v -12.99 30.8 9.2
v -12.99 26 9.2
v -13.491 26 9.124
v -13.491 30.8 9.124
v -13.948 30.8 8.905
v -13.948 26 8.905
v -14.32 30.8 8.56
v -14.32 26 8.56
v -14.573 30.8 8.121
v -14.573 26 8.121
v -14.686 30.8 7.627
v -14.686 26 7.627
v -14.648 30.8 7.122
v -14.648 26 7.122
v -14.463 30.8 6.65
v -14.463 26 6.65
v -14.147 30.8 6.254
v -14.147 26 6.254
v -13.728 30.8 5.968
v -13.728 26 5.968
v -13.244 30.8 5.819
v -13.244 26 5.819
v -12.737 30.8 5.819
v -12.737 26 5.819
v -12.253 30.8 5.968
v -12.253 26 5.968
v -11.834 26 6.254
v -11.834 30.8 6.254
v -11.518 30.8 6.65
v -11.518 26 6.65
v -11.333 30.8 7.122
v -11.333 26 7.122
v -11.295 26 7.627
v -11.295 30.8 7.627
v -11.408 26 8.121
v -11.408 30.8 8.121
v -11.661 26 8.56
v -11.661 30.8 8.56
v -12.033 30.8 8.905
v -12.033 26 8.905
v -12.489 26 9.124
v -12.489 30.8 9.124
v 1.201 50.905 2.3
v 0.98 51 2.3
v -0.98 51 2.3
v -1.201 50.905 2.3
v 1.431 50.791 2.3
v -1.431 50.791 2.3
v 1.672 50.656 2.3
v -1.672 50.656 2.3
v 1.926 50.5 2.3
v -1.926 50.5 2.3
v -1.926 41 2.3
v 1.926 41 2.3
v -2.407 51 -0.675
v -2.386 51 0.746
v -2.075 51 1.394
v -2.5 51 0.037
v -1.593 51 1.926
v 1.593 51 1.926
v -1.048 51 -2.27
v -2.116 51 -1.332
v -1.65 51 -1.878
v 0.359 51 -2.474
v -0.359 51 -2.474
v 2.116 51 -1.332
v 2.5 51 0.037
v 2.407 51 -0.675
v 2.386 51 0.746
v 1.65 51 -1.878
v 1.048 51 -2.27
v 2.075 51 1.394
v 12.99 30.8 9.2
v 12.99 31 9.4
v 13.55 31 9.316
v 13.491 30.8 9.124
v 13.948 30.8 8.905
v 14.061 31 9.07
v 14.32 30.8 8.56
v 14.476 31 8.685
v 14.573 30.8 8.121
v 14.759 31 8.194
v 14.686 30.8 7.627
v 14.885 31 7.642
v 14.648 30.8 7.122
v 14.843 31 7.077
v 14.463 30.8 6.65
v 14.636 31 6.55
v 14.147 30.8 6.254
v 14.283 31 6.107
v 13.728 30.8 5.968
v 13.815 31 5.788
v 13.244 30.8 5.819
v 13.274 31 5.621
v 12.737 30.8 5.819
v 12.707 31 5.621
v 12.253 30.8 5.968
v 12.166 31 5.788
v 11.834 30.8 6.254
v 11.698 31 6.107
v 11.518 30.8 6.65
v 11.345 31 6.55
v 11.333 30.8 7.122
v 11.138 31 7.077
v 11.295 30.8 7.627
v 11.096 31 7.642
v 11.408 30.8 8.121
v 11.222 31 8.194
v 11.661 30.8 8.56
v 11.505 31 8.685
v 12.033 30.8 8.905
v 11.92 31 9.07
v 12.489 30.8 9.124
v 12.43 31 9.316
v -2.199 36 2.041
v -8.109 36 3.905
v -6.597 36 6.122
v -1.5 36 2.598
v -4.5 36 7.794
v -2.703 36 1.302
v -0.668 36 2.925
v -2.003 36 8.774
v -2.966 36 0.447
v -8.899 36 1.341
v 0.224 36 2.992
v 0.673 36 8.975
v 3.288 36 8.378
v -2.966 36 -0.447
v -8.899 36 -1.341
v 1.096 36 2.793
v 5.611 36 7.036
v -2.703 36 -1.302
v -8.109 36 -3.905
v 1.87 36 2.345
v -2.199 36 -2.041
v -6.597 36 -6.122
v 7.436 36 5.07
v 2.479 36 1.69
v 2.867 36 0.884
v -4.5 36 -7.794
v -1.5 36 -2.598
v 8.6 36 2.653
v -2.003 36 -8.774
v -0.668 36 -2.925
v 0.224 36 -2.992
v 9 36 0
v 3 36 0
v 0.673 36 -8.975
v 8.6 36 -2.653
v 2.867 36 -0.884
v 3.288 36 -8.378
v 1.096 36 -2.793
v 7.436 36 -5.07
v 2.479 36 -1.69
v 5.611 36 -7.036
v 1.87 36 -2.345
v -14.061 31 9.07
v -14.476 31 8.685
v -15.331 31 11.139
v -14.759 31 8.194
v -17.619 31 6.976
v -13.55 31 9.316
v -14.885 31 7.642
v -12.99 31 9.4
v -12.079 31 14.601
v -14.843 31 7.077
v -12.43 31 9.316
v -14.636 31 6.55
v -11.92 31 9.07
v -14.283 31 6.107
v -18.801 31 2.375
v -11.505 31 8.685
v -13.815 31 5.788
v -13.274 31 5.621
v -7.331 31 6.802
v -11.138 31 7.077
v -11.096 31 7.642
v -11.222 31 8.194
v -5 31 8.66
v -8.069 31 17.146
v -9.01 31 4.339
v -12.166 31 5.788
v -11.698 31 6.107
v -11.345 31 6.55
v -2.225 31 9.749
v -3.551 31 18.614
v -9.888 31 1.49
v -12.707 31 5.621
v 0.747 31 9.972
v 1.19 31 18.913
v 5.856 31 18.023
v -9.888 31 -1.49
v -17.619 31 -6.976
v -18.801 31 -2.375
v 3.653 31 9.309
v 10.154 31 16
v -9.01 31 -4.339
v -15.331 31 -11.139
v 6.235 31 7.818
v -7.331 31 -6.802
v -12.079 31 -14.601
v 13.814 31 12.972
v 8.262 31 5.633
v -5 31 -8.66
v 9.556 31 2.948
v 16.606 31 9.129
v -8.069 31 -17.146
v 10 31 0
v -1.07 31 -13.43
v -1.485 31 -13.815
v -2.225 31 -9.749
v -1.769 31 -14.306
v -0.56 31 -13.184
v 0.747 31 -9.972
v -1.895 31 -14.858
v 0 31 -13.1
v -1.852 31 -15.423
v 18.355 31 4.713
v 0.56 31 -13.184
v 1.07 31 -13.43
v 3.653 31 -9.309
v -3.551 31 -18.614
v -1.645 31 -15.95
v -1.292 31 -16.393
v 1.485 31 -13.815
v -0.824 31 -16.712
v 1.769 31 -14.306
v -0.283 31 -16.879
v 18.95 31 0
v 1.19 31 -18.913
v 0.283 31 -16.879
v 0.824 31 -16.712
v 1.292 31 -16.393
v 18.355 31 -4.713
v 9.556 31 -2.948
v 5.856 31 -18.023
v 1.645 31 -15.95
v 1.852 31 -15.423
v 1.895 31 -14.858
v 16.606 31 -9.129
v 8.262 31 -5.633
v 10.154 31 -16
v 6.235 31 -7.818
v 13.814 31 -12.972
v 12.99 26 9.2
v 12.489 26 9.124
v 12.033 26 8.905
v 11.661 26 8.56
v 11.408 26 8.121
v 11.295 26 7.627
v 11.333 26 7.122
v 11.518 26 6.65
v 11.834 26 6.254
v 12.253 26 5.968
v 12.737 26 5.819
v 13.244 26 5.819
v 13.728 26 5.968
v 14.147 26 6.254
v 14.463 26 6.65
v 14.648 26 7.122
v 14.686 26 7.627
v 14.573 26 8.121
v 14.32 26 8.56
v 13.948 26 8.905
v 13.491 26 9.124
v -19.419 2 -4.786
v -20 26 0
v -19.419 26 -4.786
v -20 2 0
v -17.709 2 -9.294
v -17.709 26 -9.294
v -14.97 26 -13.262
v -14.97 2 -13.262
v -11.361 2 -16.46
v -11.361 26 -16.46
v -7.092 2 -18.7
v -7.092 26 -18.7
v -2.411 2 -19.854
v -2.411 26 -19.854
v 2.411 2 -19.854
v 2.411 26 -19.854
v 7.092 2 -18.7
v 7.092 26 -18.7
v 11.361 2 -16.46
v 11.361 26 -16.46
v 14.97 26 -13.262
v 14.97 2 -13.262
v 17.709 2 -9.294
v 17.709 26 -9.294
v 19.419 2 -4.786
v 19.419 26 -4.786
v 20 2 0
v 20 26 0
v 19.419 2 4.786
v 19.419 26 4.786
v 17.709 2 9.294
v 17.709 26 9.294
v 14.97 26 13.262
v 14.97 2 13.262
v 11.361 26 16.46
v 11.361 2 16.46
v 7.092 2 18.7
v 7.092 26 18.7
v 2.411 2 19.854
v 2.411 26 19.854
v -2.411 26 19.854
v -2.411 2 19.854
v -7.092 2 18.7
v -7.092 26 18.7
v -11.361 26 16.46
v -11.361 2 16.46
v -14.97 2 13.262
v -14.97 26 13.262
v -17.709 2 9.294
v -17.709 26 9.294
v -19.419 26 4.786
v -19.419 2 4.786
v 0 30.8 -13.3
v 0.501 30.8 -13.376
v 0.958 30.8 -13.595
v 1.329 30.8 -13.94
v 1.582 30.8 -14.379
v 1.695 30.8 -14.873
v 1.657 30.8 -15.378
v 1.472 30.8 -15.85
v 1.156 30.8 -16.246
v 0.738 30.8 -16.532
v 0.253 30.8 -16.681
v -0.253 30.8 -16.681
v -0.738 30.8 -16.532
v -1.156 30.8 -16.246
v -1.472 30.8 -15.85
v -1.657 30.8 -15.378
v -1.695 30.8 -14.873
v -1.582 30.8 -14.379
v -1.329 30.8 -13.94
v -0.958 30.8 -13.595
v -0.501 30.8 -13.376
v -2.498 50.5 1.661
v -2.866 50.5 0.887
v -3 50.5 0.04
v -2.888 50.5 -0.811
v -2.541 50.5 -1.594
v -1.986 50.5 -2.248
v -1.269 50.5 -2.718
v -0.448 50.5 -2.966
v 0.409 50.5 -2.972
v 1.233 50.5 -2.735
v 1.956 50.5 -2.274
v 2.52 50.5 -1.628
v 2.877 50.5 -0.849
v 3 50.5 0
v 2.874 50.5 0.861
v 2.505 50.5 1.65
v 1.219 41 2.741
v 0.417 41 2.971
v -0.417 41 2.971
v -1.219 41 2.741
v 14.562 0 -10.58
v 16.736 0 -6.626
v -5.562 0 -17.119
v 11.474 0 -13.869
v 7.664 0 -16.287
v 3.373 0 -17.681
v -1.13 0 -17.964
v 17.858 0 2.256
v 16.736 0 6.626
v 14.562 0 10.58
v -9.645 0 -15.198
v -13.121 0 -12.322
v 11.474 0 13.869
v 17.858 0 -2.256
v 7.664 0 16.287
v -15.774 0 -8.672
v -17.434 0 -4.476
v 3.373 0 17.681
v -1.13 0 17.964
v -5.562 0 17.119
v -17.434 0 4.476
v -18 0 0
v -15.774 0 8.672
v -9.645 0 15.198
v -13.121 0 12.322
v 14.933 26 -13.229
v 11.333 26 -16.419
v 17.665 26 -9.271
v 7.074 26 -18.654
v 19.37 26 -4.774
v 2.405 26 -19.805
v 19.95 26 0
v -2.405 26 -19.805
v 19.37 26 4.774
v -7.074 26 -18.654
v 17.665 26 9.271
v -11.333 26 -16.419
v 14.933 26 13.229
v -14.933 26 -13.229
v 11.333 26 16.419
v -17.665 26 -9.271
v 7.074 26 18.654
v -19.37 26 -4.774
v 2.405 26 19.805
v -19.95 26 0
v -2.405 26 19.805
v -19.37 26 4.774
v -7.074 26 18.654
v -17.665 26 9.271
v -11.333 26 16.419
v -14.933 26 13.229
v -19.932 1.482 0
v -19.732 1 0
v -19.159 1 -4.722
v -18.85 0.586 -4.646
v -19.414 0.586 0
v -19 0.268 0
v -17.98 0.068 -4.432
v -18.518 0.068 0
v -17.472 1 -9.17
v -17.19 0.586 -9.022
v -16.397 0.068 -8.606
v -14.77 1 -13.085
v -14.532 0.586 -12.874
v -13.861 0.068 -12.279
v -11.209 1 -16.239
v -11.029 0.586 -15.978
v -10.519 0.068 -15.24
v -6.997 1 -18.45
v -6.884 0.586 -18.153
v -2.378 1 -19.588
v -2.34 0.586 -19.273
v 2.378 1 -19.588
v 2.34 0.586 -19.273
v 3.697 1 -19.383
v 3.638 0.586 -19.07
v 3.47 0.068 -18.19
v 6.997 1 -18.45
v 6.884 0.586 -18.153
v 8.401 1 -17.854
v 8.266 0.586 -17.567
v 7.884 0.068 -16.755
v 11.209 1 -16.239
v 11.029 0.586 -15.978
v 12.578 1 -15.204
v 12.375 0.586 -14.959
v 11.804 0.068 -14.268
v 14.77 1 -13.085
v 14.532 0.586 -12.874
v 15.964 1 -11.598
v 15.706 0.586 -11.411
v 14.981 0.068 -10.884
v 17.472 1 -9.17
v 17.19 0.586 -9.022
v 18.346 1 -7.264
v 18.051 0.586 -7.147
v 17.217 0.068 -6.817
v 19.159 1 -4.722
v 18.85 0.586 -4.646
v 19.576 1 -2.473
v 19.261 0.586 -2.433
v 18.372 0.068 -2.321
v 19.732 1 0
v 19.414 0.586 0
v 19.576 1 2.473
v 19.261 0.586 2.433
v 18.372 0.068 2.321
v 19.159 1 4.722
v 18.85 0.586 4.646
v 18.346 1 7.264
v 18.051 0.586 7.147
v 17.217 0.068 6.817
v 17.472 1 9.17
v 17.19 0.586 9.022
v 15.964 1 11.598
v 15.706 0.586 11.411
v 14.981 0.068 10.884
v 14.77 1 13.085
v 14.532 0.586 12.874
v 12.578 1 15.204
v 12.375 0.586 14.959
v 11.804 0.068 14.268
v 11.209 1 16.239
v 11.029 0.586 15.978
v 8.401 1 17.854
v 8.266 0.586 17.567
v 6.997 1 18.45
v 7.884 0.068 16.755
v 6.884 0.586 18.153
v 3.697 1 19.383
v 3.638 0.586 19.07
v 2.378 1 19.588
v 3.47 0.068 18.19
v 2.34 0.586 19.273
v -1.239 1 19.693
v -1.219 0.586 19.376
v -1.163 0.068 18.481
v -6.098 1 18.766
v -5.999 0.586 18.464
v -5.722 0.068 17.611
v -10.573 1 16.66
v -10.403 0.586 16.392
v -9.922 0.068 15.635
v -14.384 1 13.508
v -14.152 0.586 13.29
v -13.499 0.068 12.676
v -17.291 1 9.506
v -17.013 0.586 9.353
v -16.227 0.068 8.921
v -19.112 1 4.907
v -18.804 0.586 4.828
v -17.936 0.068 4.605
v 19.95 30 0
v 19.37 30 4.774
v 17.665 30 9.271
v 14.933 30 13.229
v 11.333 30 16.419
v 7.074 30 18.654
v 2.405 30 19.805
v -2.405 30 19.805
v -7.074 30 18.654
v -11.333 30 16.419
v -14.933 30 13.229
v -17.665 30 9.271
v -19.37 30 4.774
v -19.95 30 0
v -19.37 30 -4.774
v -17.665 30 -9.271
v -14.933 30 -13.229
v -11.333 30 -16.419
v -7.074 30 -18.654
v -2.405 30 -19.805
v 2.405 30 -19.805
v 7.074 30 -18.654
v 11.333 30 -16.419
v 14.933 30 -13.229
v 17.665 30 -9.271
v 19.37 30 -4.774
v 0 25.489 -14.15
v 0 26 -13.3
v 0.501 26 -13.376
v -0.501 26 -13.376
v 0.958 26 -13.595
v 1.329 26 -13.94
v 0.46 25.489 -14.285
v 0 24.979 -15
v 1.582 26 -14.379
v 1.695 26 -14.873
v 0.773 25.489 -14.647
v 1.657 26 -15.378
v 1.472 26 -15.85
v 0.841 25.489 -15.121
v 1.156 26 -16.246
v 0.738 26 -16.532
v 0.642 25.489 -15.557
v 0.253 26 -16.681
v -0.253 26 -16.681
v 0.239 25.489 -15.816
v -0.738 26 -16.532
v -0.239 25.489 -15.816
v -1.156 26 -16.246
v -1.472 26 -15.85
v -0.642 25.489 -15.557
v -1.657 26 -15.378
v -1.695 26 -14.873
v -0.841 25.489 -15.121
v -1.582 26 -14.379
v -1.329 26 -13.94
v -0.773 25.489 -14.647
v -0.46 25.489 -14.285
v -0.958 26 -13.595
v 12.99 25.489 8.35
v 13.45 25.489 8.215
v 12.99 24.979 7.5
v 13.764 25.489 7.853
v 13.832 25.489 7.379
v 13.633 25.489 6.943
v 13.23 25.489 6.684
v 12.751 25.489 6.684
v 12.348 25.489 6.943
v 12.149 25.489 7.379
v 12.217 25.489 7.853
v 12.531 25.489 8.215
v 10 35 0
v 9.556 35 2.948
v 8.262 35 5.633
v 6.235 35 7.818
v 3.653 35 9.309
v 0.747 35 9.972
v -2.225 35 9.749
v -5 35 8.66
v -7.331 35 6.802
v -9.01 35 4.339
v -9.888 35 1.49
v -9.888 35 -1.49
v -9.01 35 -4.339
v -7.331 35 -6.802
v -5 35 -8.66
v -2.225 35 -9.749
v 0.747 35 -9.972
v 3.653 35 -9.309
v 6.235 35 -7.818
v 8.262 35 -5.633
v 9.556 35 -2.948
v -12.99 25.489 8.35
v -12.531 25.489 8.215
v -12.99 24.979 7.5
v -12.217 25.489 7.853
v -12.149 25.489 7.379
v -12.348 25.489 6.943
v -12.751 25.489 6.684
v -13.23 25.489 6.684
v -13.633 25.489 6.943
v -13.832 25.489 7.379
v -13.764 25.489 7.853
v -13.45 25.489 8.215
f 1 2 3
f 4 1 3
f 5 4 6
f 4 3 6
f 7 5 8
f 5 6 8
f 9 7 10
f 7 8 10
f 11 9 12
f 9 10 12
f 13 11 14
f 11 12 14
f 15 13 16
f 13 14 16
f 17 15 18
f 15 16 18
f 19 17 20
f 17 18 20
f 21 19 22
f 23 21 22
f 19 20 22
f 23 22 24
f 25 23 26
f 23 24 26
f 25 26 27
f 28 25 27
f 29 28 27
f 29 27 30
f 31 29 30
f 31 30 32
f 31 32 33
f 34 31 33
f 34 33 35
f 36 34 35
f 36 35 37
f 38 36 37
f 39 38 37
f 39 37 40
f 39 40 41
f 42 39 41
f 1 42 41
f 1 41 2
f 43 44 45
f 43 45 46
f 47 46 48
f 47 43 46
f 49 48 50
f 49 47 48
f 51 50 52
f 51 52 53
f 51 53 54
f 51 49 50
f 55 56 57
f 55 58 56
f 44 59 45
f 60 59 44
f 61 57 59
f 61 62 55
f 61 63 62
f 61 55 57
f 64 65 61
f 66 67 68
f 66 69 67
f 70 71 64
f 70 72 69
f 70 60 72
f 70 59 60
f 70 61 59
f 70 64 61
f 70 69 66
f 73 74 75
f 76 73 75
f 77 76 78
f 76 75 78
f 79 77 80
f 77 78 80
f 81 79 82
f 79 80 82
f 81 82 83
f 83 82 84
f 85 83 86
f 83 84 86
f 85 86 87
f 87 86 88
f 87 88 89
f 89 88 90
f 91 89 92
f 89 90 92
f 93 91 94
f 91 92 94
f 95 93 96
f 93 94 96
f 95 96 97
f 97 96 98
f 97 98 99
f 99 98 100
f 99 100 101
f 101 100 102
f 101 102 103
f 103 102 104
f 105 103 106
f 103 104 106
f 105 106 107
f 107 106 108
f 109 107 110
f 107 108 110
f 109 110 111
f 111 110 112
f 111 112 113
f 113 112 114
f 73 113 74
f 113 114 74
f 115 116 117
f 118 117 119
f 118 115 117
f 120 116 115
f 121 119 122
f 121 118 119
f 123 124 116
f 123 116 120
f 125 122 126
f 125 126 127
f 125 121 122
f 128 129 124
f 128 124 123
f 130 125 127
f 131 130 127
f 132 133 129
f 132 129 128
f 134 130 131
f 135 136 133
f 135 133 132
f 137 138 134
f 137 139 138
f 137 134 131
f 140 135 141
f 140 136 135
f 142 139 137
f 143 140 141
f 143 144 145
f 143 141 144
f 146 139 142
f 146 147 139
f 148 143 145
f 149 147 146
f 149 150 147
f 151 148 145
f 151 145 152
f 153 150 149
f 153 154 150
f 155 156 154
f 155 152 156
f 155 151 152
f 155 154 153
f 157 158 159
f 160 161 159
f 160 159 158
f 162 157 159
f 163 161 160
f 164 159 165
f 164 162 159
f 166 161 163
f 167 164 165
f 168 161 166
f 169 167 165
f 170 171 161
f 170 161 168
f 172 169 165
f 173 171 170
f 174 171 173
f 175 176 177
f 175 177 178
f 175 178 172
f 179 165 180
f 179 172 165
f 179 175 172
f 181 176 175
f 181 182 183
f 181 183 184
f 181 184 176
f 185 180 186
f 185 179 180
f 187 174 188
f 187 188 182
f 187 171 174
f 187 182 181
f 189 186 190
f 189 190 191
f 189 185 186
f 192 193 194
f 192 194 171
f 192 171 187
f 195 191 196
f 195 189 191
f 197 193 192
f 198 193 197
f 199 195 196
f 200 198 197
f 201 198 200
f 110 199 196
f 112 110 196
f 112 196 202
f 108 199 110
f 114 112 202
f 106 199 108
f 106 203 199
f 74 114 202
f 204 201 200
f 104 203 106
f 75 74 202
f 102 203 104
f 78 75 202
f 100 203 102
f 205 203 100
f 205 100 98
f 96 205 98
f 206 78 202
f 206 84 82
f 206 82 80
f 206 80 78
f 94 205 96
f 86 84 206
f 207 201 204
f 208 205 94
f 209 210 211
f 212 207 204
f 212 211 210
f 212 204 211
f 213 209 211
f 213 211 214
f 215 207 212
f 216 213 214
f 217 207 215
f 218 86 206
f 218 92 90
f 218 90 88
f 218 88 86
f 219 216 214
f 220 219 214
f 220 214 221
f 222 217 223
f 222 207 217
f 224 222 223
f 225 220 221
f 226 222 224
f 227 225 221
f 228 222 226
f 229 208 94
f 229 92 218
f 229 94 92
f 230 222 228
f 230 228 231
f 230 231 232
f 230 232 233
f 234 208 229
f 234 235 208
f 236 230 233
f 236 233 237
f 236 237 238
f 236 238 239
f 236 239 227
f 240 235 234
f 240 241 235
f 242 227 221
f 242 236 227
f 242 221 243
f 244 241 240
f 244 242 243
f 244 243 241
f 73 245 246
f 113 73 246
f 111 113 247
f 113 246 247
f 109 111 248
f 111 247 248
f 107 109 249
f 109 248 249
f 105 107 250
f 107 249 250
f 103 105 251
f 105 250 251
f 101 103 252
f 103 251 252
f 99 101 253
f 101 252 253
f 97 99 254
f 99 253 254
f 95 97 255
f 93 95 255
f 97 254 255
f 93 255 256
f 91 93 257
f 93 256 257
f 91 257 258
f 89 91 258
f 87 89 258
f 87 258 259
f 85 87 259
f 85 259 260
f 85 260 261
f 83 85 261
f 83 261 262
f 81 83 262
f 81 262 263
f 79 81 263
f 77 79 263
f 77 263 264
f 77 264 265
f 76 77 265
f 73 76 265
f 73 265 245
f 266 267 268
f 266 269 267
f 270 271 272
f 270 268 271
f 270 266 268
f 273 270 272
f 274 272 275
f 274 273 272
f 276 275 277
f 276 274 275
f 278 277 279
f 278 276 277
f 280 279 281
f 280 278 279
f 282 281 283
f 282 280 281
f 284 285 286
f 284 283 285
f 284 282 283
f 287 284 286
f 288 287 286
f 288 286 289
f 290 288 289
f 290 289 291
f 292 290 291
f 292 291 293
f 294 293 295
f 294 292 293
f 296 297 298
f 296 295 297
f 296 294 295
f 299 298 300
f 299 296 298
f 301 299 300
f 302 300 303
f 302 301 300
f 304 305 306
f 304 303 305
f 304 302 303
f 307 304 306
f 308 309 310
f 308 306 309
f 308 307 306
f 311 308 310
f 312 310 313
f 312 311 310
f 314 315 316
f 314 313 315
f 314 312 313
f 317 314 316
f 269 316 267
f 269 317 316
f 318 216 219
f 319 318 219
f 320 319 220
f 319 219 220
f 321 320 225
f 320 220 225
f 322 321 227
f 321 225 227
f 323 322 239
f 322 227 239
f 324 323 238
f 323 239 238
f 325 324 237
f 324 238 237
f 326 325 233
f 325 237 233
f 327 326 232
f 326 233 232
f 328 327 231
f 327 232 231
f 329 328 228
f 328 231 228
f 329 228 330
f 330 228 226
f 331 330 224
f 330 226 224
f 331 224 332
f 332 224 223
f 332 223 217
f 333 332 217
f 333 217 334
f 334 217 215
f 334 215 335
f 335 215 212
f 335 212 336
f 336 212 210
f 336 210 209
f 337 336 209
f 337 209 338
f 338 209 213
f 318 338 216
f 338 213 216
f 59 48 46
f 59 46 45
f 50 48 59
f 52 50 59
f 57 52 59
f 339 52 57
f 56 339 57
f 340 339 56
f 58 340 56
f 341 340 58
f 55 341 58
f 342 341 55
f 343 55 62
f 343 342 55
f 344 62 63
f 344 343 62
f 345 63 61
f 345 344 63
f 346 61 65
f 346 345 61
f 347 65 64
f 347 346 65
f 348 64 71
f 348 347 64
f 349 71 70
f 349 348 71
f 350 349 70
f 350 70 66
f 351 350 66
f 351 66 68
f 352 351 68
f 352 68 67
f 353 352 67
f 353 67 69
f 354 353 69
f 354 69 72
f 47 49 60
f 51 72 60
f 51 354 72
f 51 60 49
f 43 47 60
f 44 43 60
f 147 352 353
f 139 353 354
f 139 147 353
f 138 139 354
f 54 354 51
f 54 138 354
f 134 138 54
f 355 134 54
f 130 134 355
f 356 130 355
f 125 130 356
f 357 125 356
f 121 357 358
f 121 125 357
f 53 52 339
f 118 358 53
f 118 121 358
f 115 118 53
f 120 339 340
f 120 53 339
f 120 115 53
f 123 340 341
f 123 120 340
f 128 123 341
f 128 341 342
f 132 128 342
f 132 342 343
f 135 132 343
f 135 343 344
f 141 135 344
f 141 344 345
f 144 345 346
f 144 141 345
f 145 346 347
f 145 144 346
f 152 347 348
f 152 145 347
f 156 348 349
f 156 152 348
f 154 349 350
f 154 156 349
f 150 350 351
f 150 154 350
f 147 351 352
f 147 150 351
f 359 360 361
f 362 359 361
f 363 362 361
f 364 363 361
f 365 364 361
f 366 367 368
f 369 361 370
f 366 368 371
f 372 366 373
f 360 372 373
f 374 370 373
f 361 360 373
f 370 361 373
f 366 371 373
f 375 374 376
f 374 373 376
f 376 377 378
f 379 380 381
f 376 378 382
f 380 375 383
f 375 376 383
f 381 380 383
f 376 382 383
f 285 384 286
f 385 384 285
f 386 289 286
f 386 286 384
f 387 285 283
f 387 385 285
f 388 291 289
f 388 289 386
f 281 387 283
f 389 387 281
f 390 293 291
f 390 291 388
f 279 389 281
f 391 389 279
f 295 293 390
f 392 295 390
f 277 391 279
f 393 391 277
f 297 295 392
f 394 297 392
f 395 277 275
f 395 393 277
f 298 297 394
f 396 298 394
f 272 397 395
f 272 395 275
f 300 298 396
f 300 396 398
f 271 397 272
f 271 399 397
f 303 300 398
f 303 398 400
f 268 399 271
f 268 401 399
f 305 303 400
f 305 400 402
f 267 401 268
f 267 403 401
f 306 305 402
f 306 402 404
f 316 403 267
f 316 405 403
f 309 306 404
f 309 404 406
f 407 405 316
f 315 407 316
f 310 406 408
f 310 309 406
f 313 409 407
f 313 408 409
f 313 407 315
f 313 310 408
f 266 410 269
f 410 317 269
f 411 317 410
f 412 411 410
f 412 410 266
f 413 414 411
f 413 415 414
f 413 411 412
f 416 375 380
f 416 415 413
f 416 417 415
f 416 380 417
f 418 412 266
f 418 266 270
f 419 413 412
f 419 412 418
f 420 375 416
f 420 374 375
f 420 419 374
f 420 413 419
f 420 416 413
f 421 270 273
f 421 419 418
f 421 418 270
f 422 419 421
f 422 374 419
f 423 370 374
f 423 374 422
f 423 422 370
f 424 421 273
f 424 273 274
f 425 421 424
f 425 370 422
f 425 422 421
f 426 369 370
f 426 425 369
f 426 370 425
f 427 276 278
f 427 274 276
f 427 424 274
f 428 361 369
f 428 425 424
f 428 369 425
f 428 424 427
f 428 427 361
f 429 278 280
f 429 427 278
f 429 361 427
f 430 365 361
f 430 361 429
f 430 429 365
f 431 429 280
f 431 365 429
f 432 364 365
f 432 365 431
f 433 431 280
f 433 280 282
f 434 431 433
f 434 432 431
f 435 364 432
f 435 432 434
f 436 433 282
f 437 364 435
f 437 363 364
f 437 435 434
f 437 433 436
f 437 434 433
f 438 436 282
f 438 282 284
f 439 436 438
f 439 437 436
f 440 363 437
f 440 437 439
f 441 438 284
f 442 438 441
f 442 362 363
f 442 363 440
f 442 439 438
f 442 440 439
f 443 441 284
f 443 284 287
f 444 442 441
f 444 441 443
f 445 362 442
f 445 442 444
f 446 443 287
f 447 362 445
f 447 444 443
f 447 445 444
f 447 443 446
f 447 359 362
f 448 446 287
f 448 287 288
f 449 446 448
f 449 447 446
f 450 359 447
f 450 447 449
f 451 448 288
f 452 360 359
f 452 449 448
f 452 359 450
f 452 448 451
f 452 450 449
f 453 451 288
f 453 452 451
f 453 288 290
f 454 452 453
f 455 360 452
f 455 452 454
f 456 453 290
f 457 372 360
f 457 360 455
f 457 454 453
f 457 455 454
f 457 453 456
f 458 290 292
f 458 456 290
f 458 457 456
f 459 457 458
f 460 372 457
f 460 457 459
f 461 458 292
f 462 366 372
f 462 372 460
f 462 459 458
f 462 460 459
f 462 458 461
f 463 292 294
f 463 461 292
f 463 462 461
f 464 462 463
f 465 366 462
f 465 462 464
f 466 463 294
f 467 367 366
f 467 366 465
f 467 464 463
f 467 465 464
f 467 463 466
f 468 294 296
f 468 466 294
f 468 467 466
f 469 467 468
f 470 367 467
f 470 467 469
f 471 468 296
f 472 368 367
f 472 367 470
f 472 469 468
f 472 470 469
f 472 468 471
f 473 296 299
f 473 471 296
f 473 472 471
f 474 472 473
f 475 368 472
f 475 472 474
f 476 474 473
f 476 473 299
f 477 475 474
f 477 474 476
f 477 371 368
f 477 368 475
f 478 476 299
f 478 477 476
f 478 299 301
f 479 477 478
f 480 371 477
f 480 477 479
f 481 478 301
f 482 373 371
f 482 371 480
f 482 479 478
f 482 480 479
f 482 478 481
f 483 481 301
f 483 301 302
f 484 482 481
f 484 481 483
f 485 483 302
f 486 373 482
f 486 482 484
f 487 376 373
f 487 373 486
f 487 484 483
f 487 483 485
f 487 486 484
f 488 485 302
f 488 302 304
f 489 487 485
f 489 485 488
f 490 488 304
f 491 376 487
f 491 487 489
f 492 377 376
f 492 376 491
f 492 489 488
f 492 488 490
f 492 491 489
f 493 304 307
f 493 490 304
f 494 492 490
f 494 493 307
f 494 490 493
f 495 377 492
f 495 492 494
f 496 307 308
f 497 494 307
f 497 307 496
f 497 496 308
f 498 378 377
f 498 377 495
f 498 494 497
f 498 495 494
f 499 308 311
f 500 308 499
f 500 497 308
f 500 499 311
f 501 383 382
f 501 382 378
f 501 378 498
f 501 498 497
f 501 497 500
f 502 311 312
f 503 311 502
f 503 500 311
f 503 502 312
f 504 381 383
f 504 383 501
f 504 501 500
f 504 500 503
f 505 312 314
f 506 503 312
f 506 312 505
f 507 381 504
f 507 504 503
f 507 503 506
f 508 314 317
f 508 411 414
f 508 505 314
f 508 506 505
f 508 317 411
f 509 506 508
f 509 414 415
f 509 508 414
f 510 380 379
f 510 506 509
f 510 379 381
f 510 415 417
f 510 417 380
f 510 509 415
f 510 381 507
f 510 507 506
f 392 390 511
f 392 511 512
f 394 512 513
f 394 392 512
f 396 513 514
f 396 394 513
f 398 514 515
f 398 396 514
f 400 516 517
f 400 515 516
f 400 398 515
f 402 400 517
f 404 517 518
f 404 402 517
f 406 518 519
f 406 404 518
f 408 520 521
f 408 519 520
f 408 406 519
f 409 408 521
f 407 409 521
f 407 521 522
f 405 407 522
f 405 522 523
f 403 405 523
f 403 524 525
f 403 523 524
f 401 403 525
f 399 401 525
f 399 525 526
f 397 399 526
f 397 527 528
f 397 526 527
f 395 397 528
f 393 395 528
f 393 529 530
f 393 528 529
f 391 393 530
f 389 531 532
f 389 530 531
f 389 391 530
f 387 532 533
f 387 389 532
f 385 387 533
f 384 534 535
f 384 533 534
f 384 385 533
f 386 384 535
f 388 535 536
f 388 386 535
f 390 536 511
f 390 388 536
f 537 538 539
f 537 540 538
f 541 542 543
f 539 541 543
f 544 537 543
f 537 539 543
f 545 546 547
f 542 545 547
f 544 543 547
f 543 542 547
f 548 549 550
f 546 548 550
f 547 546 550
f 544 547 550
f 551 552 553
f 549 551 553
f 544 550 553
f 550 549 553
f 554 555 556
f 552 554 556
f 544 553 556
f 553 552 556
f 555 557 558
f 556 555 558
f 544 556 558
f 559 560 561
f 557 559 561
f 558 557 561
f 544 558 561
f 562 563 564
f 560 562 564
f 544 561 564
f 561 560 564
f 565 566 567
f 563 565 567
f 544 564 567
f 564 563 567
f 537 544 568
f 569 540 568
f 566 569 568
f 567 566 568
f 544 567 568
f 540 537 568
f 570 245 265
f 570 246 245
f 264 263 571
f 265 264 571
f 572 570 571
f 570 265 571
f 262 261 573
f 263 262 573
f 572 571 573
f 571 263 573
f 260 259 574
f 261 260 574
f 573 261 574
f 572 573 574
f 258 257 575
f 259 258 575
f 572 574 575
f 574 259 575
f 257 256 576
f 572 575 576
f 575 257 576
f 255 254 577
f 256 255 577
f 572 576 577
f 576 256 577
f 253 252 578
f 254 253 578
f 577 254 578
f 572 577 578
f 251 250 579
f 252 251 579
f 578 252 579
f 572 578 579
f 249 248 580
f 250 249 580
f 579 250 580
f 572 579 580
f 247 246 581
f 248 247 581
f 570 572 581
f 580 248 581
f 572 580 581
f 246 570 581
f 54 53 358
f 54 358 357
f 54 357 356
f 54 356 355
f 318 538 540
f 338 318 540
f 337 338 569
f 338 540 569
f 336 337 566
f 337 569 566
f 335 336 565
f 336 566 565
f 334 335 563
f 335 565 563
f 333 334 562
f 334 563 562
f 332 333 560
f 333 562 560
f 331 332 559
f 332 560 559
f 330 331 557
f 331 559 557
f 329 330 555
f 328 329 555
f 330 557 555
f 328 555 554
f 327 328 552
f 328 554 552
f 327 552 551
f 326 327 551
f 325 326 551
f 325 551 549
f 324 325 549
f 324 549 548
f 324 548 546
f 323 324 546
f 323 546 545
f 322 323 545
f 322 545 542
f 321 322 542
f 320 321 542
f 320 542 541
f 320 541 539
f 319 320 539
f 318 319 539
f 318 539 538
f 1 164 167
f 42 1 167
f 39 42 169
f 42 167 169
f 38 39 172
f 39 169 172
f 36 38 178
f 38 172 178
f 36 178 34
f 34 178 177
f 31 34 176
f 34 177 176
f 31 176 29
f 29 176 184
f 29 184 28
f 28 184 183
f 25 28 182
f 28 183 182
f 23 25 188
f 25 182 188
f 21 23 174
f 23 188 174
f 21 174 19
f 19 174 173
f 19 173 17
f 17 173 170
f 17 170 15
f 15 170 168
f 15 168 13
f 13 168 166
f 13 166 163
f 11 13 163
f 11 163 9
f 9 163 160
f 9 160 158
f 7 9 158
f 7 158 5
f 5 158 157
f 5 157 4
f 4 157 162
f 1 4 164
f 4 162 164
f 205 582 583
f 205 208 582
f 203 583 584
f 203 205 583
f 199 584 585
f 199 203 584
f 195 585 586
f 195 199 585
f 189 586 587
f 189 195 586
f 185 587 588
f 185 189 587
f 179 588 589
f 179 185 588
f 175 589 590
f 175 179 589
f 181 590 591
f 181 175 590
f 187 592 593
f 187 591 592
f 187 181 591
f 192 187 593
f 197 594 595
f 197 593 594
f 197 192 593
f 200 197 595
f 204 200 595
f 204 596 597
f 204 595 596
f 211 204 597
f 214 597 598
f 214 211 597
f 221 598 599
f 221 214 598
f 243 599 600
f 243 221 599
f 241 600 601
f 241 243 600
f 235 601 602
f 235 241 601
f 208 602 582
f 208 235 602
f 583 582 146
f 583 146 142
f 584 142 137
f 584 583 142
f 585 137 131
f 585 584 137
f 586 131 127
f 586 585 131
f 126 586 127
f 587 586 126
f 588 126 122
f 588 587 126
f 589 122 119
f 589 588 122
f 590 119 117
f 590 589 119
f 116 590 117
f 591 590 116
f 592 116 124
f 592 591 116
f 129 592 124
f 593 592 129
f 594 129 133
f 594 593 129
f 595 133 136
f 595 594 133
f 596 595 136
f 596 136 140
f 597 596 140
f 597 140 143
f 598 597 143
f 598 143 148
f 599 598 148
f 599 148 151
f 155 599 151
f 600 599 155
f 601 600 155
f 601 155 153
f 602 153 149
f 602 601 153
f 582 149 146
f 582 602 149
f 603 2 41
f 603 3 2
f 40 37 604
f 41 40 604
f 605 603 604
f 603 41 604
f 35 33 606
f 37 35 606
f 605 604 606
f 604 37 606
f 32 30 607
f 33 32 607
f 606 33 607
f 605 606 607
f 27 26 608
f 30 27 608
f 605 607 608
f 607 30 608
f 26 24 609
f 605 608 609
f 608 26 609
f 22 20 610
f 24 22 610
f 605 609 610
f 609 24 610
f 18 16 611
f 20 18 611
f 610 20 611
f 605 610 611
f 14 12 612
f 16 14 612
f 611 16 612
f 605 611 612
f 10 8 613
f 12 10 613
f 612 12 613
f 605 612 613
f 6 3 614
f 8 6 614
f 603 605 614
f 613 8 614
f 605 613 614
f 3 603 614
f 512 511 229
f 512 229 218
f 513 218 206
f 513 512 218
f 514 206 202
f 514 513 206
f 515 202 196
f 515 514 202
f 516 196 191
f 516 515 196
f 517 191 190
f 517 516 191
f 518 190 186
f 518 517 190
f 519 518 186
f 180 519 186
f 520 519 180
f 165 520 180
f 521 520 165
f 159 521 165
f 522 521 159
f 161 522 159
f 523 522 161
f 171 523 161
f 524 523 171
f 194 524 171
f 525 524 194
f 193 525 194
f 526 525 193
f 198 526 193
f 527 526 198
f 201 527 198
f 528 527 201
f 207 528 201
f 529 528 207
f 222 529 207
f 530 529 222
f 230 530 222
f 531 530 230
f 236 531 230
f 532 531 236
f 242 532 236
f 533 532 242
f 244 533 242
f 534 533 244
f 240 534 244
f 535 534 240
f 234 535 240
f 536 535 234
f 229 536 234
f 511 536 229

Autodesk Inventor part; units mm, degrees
ref_plane "YZ Plane" through (0, 0, 0) normal (1, 0, 0) x (0, 1, 0)
ref_plane "XZ Plane" through (0, 0, 0) normal (0, 1, 0) x (-1, 0, 0)
ref_plane "XY Plane" through (0, 0, 0) normal (0, 0, 1) x (1, 0, 0)
sketch "Sketch1" plane through (0, 0, 0) normal (0, 1, 0) x (-1, 0, 0)
  circle A0 centre (0, 0) radius 20
  dimension "d0" = 40
extrude "Extrusion1" add sketch "Sketch1" along normal blind 26
sketch "Sketch2" plane through (0, 26, 0) normal (0, 1, 0) x (1, 0, 0)
  circle A0 centre (0, 0) radius 19.95
  dimension "d3" = 39.9
extrude "Extrusion2" add sketch "Sketch2" along normal blind 5
sketch "Sketch3" plane through (0, 31, 0) normal (0, 1, 0) x (1, 0, 0)
  circle A0 centre (0, 0) radius 10
  dimension "d6" = 20
extrude "Extrusion3" add sketch "Sketch3" along normal blind 5
sketch "Sketch4" plane through (0, 36, 0) normal (0, 1, 0) x (1, 0, 0)
  circle A0 centre (0, 0) radius 3
  dimension "d9" = 6
extrude "Extrusion4" add sketch "Sketch4" along normal blind 15
sketch "Sketch5" plane through (0, 51, 0) normal (0, 1, 0) x (1, 0, 0)
  circle A0 centre (0, 0) radius 3 projected
  circle A1 centre (0, 0) radius 3 projected
  line L0 (-1.9261, -2.3) -> (1.9261, -2.3)
  dimension "d12" = 2.3
extrude "Extrusion5" cut sketch "Sketch5" against normal blind 10 contours L0 A0 picked at (0.4482, -2.4273)
fillet "Fillet1" radius 2 1 edges at (20, 0, 0)
chamfer "Chamfer1" distance 1 angle 45 2 edges at (-19.95, 31, 0) (-10, 36, 0)
chamfer "Chamfer2" distance 0.5 angle 45 2 edges at (2.7183, 51, 1.2692) (-1.2692, 51, -2.7183)
sketch "Sketch6" plane through (0, 31, 0) normal (0, 1, 0) x (1, 0, 0)
  point P0 (0, 0)
  point P1 (0, 15)
  point P2 (-12.9904, -7.5)
  point P3 (12.9904, -7.5)
  dimension "d23" = 15
  dimension "d26" = 360
hole "Hole1" at (0, 31, -15) at (-12.9904, 31, 7.5) at (12.9904, 31, 7.5) direction (0, -1, 0) diameter 3.4 depth 5 tip angle 118 countersink diameter 3.8 countersink angle 90 clearance for "Countersunk Raised Head Screw ISO 2010/7047" size "M3" standard "ISO"
properties part number "Encoder" material "Stainless Steel"
